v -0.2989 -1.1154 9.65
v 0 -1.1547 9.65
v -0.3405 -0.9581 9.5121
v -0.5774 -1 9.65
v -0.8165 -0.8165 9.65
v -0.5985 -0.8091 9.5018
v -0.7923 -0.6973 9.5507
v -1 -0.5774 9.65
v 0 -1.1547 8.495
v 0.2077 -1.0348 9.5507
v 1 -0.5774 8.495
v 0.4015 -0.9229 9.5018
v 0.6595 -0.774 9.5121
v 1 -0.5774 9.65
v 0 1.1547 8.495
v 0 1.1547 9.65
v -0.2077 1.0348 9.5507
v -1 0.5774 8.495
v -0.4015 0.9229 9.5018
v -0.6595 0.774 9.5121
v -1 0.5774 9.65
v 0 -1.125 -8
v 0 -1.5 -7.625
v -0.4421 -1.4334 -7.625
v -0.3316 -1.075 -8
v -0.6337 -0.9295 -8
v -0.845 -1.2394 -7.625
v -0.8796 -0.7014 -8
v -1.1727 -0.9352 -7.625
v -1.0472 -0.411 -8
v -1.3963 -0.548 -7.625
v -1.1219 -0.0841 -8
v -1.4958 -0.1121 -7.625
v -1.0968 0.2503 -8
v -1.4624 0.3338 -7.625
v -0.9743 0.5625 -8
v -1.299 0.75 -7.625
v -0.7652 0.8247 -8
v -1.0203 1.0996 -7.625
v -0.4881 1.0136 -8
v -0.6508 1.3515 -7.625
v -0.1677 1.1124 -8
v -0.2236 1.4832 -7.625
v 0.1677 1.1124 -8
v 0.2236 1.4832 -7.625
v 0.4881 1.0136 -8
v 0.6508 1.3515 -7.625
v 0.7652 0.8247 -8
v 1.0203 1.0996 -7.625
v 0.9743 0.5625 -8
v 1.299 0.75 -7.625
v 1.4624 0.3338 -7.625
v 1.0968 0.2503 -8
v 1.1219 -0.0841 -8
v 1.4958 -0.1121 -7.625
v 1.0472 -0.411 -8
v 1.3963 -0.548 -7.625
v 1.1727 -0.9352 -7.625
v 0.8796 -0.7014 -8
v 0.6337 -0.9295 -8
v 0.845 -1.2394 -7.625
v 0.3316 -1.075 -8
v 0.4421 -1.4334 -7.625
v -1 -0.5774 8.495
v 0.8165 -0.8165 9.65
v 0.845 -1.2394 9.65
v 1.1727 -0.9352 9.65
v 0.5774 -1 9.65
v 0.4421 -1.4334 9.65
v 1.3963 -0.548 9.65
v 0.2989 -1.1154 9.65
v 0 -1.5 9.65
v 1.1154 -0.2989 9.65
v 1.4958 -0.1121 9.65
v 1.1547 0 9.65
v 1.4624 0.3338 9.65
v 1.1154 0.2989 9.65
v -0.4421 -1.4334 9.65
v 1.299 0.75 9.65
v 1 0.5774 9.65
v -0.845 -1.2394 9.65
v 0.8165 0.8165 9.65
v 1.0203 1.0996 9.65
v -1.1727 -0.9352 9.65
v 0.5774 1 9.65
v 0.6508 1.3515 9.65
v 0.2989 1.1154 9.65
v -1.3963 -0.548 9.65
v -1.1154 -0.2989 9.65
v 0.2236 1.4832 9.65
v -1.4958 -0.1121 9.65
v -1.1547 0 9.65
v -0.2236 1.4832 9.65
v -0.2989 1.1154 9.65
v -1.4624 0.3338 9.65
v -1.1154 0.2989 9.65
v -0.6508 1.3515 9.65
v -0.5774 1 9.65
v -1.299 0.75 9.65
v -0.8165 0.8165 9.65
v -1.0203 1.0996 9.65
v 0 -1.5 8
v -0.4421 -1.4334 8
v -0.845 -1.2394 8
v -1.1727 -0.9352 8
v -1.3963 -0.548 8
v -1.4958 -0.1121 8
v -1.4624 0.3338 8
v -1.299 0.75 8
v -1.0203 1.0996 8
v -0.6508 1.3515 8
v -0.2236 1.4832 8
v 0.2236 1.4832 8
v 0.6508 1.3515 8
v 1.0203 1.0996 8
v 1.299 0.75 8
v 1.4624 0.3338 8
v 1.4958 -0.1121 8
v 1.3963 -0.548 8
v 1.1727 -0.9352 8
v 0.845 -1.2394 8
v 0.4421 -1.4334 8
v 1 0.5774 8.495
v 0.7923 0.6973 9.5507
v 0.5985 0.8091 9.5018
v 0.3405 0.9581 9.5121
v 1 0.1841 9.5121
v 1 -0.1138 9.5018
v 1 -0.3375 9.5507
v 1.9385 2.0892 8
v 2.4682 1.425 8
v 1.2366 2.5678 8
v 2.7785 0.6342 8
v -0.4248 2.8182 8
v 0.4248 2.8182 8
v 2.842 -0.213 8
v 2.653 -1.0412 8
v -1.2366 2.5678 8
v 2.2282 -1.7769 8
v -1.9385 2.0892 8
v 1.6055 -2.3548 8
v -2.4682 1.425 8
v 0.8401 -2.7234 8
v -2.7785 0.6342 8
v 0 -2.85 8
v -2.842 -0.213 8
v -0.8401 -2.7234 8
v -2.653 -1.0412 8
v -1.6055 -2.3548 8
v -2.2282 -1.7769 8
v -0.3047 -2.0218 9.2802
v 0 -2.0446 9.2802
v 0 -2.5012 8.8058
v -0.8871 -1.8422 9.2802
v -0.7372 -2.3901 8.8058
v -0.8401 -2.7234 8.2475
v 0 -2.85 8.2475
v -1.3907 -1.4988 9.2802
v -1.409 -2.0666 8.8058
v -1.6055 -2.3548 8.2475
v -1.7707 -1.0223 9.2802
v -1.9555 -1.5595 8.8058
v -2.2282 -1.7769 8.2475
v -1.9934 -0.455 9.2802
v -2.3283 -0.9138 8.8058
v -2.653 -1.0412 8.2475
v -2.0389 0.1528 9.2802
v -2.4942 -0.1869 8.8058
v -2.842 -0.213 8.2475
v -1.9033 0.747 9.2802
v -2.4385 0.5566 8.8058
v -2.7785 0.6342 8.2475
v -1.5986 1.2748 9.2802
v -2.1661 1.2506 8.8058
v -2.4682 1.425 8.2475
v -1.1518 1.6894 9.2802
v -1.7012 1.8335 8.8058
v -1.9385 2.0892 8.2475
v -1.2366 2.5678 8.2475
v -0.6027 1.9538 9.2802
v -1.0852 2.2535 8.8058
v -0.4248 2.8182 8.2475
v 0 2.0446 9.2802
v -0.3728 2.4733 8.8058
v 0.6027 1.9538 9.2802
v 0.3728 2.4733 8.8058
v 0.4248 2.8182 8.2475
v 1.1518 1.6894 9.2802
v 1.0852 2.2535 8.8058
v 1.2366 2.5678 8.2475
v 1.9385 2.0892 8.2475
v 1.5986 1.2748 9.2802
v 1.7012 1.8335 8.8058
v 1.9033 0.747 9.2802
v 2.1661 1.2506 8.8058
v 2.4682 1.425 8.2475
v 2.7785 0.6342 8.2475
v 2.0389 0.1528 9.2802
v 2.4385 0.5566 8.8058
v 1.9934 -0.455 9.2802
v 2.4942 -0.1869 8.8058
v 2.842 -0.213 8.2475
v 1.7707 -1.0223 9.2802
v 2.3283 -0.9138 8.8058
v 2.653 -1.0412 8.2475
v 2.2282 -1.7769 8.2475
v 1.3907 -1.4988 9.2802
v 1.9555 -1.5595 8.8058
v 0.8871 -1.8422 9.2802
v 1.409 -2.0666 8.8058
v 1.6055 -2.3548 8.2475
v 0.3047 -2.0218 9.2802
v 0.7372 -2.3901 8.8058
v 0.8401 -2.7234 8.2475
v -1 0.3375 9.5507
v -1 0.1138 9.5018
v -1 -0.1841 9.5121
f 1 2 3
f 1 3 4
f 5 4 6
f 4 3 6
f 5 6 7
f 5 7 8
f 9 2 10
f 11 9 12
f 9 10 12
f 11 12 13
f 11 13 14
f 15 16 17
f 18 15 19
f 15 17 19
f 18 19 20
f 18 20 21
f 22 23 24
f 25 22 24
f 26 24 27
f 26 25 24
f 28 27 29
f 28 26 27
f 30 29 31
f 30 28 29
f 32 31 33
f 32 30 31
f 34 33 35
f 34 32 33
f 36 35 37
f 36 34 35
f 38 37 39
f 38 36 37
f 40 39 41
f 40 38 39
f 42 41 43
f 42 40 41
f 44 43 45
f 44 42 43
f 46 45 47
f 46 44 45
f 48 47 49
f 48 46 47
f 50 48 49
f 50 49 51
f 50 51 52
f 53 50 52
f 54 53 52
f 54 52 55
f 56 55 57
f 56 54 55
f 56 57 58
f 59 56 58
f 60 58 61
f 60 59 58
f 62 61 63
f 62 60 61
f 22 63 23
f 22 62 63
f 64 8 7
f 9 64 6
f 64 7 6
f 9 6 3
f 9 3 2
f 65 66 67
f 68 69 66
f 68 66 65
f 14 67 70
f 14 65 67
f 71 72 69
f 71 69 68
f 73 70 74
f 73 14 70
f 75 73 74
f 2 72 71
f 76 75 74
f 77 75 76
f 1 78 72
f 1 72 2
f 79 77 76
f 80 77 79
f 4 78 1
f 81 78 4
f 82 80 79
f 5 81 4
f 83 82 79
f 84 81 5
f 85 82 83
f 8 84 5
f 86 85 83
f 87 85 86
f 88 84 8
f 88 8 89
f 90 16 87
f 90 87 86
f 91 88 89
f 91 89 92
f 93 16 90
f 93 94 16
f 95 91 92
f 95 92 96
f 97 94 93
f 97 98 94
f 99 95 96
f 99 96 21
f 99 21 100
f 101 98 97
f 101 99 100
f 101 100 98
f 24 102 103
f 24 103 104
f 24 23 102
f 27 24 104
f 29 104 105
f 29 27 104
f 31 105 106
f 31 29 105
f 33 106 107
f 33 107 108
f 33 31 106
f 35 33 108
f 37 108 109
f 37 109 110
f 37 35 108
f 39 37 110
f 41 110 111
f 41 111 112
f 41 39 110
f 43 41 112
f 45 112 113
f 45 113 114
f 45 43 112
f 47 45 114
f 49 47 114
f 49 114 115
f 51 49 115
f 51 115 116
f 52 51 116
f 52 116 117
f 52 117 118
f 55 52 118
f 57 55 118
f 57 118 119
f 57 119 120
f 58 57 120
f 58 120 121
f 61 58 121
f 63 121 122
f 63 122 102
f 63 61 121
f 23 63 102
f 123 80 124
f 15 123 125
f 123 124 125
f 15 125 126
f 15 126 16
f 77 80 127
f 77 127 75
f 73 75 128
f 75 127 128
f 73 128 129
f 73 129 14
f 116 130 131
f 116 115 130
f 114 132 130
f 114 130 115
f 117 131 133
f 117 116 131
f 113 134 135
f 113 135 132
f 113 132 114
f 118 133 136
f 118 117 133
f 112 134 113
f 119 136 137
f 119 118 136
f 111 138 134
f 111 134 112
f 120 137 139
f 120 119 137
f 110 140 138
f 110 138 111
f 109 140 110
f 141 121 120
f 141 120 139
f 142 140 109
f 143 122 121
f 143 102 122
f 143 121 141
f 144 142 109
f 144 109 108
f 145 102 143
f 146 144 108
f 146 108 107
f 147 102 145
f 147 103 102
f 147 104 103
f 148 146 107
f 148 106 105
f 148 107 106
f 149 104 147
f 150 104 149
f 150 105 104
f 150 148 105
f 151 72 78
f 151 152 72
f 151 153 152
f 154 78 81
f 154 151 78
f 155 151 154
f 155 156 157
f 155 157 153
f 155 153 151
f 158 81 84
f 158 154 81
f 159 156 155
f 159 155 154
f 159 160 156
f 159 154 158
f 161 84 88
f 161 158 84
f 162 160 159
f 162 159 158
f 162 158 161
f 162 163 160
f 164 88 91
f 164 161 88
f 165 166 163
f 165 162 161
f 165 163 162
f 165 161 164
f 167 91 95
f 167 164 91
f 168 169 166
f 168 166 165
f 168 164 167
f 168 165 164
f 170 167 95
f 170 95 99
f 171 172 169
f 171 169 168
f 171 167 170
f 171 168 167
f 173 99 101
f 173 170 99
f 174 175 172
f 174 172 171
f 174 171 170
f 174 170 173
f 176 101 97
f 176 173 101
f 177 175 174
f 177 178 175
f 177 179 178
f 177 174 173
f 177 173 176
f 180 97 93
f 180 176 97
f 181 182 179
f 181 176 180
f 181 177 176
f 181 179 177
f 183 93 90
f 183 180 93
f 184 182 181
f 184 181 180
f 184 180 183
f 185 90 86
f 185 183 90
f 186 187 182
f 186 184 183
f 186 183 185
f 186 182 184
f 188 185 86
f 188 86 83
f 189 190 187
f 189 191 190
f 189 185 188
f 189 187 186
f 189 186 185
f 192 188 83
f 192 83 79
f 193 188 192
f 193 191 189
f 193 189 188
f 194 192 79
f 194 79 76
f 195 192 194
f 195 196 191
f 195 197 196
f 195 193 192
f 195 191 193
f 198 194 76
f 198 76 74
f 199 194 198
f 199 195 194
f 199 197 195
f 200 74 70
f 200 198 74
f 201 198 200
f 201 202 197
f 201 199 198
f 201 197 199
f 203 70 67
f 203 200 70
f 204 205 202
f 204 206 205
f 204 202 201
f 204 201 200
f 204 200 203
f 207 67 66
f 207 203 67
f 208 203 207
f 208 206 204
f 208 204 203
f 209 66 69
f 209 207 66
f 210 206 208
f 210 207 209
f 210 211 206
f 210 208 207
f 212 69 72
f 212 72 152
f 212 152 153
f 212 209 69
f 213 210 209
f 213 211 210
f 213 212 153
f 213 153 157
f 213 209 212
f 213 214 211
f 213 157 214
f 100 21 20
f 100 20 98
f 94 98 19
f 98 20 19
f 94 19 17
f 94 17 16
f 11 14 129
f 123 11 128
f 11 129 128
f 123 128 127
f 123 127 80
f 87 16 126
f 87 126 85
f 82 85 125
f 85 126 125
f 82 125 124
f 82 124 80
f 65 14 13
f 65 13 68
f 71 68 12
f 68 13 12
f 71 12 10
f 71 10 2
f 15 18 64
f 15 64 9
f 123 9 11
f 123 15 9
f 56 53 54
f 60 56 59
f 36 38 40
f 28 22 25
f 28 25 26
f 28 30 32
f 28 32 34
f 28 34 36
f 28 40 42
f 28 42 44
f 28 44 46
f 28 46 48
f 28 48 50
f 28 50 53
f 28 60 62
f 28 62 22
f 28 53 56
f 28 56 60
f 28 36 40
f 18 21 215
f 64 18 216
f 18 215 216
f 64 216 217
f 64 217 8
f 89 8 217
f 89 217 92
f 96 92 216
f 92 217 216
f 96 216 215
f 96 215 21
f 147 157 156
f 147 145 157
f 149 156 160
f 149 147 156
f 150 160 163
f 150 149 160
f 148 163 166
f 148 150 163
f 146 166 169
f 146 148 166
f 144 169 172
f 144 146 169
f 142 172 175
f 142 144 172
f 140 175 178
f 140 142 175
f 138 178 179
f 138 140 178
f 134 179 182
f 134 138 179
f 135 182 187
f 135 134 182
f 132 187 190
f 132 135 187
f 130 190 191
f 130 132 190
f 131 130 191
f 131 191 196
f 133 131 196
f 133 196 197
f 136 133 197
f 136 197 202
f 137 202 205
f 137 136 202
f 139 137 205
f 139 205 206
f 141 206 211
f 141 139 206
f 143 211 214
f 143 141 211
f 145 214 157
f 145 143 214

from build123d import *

# Parameters (mm, degrees)
CUT_EXTRUDE2_DEPTH = 1.155


with BuildPart() as part:
    # Sketch10 → Revolve3 (revolve)
    with BuildSketch(Plane(origin=(0, 0, 0), x_dir=(0, 0, -1), z_dir=(1, 0, 0))):
        Polygon((7.625, 1.5), (8, 1.125), (8, 0), (-8, 0), (-8, 1.5), align=None)
    revolve(axis=Axis((0, 0, 9.65), (0, 0, -1)))

    # Sketch7 → Revolve2 (revolve)
    with BuildSketch(Plane(origin=(0, 0, 0), x_dir=(0, 0, -1), z_dir=(1, 0, 0))):
        with BuildLine():
            Line((-8.2475, 2.85), (-8, 2.85))
            Line((-8, 2.85), (-8, 0))
            Line((-8, 0), (-9.65, 0))
            Line((-9.65, 0), (-9.65, 1.5))
            ThreePointArc((-9.65, 1.5), (-9.05487489, 2.285251969), (-8.2475, 2.85))
        make_face()
    revolve(axis=Axis((0, 0, 9.65), (0, 0, -1)))

    # Sketch5 → Cut-Extrude2 (cut)
    with BuildSketch(Plane.XY.offset(9.65)):
        Polygon((1, -0.577350269), (1, 0.577350269), (0, 1.154700538), (-1, 0.577350269), (-1, -0.577350269), (0, -1.154700538), align=None)
    extrude(amount=-CUT_EXTRUDE2_DEPTH, mode=Mode.SUBTRACT)

    # Cut-Extrude3 cone 1 section (through the dimple's axis) → Cut-Extrude3 (revolve, cut)
    with BuildSketch(Plane(origin=(0, 0, 9.65), x_dir=(0, -1, 0), z_dir=(1, 0, 0))):
        Polygon((0, 0), (1.154700538, 0), (0, 1.154700538), align=None)
    revolve(axis=Axis((0, 0, 9.65), (0, 0, -1)), mode=Mode.SUBTRACT)


solid = part.part
